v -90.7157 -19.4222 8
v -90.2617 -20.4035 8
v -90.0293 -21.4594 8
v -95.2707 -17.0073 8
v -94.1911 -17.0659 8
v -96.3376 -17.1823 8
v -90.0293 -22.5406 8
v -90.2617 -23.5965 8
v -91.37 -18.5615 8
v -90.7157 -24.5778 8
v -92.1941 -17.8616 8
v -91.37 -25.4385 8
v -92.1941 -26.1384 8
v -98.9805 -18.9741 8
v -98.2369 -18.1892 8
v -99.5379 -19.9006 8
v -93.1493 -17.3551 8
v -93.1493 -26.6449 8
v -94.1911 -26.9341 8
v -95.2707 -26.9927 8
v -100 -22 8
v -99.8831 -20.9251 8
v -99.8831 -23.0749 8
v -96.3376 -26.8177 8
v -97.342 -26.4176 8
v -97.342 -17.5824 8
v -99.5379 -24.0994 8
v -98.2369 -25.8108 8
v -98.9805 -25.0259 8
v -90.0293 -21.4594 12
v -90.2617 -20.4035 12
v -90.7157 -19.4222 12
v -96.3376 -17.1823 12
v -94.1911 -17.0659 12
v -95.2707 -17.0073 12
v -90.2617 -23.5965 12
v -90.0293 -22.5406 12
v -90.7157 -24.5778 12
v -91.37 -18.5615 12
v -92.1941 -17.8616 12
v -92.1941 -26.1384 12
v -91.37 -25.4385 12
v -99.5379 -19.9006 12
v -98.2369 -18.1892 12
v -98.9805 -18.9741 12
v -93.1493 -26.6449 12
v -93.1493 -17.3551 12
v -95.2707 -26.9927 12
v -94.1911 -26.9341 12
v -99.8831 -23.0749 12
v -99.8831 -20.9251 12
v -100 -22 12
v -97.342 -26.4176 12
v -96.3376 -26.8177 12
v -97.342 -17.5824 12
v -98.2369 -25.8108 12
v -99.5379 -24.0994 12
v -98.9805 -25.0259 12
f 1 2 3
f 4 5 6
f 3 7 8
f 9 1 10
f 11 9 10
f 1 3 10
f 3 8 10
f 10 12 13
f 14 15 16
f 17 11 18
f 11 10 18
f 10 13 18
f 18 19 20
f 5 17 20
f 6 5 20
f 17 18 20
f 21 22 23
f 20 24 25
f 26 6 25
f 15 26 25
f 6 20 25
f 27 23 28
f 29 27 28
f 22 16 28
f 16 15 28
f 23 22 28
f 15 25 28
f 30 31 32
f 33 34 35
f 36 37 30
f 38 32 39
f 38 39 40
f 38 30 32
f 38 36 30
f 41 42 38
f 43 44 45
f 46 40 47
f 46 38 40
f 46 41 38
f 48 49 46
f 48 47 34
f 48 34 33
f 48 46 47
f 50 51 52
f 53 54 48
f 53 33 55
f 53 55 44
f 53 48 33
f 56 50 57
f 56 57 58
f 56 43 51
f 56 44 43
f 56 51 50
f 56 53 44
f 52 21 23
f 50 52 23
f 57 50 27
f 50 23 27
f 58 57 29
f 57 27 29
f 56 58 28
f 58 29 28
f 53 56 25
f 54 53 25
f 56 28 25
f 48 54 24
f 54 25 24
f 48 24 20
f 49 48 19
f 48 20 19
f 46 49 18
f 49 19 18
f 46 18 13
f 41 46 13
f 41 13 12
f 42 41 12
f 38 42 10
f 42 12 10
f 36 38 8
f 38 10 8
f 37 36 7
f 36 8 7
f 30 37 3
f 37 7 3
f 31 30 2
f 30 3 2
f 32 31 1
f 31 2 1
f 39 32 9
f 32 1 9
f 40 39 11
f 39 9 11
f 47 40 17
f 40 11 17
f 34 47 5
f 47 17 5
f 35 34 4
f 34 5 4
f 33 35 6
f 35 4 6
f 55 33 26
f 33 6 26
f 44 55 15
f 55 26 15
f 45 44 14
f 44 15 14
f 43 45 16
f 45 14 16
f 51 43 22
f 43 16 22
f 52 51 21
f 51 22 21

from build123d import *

# Parameters (mm, degrees)
CYLINDER004_R     = 5
CYLINDER004_DEPTH = 4


with BuildPart() as f_623zz:
    # Cylinder004 → Cylinder004 (new body)
    with BuildSketch(Plane(origin=(95, 22, 8), x_dir=(1, 0, 0), z_dir=(0, 0, 1))):
        Circle(CYLINDER004_R)
    extrude(amount=CYLINDER004_DEPTH)


with BuildPart() as part_mirroring011:
    # Part__Mirroring011: instance of 623ZZ
    add(f_623zz.part.mirror(Plane(origin=(0, 0, 0), x_dir=(1, 0, 0), z_dir=(0, 1, 0))))


with BuildPart() as part_mirroring015:
    # Part__Mirroring015: instance of Part__Mirroring011
    add(part_mirroring011.part.mirror(Plane(origin=(0, 0, 0), x_dir=(0, -1, 0), z_dir=(1, 0, 0))))


solid = part_mirroring015.part
